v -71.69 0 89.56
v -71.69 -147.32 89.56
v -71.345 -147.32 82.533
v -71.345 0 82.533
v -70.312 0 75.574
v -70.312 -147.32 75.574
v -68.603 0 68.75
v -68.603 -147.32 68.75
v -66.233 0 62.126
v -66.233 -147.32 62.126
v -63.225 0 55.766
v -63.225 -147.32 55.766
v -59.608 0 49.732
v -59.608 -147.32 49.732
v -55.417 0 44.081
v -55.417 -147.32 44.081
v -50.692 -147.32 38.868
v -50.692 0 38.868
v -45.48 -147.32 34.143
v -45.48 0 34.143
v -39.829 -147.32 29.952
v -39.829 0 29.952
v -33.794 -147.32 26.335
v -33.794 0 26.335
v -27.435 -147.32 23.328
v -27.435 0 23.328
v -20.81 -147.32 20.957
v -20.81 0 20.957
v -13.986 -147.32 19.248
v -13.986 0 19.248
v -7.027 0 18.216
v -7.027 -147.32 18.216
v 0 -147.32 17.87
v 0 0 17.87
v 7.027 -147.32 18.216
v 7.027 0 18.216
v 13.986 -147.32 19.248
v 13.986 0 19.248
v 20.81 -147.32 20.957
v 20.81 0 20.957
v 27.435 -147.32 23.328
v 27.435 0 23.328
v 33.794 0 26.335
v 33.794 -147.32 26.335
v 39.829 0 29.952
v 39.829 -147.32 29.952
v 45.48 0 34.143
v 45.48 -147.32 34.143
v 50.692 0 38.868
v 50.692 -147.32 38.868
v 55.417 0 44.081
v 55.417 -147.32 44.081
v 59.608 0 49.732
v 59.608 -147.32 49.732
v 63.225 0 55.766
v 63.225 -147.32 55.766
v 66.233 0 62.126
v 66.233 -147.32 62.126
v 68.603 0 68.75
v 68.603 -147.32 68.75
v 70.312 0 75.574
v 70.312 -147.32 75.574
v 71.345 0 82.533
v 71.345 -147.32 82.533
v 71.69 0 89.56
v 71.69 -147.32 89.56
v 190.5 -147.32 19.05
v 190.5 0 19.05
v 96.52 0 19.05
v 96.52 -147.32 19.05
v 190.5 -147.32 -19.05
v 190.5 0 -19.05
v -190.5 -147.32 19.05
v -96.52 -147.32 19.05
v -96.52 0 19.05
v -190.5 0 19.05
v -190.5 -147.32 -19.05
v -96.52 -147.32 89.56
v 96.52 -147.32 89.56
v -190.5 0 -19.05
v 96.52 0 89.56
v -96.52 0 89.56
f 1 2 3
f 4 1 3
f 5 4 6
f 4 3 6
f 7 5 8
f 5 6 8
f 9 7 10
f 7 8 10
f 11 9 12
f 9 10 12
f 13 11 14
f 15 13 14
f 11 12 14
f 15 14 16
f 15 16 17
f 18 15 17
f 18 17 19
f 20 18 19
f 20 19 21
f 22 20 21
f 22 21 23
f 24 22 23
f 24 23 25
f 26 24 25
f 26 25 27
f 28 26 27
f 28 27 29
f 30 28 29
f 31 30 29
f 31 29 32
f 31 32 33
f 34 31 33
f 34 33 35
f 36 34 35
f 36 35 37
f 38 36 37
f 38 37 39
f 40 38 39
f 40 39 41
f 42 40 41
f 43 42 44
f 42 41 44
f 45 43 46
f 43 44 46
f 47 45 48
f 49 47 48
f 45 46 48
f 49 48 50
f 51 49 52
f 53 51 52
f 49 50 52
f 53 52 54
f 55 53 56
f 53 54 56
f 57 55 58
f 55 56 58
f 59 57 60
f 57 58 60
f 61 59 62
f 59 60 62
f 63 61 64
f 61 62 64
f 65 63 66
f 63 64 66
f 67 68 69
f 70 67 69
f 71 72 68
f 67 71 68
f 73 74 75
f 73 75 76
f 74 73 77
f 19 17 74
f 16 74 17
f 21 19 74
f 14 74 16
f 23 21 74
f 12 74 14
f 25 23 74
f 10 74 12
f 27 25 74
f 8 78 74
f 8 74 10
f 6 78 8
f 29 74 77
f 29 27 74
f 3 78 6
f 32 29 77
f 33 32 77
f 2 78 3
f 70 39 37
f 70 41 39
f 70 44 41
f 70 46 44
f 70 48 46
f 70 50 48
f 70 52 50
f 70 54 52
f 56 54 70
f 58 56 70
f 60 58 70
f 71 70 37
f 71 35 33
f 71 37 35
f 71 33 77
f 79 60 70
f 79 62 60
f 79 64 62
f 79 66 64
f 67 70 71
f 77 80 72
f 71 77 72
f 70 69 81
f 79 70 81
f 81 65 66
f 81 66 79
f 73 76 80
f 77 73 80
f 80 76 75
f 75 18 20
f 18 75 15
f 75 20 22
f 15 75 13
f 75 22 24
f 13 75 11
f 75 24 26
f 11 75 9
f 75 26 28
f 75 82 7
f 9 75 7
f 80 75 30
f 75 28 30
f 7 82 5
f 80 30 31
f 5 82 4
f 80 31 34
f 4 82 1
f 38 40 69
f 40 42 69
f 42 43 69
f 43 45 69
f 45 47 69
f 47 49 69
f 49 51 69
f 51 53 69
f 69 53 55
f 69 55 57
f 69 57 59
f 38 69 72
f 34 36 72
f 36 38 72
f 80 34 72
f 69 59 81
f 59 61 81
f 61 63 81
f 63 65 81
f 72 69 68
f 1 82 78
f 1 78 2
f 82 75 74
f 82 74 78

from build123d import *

# Parameters (mm, degrees)
F0_W     = 193.04
F0_H     = 70.5103150129
F1_DEPTH = 147.32
F3_DEPTH = 25.4
F4_DEPTH = 147.32


with BuildPart() as f1:
    # F0 (on Front) → F1 (new body)
    with BuildSketch(Plane.XZ):
        Polygon((-190.5, -19.05), (190.5, -19.05), (190.5, 19.05), (96.52, 19.05), (-96.52, 19.05), (-190.5, 19.05), align=None)
        with Locations((0, 54.3051575065)):
            Rectangle(F0_W, F0_H)
    extrude(amount=F1_DEPTH)

    # F2 (on face) → F3 (cut)
    with BuildSketch(Plane.XZ.offset(147.32)):
        with BuildLine():
            ThreePointArc((-71.6898662242, 89.5603150129), (0, 17.8704487887), (71.6898662242, 89.5603150129))
            Line((71.6898662242, 89.5603150129), (-71.6898662242, 89.5603150129))
        make_face()
    extrude(amount=-F3_DEPTH, mode=Mode.SUBTRACT)

    # F4 (cut): a face of the model
    f4_faces = [f1.faces().sort_by_distance(p)[0] for p in [
        (0, -121.92, 59.1341908018),
    ]]
    extrude(f4_faces, amount=-F4_DEPTH, mode=Mode.SUBTRACT)


solid = f1.part
